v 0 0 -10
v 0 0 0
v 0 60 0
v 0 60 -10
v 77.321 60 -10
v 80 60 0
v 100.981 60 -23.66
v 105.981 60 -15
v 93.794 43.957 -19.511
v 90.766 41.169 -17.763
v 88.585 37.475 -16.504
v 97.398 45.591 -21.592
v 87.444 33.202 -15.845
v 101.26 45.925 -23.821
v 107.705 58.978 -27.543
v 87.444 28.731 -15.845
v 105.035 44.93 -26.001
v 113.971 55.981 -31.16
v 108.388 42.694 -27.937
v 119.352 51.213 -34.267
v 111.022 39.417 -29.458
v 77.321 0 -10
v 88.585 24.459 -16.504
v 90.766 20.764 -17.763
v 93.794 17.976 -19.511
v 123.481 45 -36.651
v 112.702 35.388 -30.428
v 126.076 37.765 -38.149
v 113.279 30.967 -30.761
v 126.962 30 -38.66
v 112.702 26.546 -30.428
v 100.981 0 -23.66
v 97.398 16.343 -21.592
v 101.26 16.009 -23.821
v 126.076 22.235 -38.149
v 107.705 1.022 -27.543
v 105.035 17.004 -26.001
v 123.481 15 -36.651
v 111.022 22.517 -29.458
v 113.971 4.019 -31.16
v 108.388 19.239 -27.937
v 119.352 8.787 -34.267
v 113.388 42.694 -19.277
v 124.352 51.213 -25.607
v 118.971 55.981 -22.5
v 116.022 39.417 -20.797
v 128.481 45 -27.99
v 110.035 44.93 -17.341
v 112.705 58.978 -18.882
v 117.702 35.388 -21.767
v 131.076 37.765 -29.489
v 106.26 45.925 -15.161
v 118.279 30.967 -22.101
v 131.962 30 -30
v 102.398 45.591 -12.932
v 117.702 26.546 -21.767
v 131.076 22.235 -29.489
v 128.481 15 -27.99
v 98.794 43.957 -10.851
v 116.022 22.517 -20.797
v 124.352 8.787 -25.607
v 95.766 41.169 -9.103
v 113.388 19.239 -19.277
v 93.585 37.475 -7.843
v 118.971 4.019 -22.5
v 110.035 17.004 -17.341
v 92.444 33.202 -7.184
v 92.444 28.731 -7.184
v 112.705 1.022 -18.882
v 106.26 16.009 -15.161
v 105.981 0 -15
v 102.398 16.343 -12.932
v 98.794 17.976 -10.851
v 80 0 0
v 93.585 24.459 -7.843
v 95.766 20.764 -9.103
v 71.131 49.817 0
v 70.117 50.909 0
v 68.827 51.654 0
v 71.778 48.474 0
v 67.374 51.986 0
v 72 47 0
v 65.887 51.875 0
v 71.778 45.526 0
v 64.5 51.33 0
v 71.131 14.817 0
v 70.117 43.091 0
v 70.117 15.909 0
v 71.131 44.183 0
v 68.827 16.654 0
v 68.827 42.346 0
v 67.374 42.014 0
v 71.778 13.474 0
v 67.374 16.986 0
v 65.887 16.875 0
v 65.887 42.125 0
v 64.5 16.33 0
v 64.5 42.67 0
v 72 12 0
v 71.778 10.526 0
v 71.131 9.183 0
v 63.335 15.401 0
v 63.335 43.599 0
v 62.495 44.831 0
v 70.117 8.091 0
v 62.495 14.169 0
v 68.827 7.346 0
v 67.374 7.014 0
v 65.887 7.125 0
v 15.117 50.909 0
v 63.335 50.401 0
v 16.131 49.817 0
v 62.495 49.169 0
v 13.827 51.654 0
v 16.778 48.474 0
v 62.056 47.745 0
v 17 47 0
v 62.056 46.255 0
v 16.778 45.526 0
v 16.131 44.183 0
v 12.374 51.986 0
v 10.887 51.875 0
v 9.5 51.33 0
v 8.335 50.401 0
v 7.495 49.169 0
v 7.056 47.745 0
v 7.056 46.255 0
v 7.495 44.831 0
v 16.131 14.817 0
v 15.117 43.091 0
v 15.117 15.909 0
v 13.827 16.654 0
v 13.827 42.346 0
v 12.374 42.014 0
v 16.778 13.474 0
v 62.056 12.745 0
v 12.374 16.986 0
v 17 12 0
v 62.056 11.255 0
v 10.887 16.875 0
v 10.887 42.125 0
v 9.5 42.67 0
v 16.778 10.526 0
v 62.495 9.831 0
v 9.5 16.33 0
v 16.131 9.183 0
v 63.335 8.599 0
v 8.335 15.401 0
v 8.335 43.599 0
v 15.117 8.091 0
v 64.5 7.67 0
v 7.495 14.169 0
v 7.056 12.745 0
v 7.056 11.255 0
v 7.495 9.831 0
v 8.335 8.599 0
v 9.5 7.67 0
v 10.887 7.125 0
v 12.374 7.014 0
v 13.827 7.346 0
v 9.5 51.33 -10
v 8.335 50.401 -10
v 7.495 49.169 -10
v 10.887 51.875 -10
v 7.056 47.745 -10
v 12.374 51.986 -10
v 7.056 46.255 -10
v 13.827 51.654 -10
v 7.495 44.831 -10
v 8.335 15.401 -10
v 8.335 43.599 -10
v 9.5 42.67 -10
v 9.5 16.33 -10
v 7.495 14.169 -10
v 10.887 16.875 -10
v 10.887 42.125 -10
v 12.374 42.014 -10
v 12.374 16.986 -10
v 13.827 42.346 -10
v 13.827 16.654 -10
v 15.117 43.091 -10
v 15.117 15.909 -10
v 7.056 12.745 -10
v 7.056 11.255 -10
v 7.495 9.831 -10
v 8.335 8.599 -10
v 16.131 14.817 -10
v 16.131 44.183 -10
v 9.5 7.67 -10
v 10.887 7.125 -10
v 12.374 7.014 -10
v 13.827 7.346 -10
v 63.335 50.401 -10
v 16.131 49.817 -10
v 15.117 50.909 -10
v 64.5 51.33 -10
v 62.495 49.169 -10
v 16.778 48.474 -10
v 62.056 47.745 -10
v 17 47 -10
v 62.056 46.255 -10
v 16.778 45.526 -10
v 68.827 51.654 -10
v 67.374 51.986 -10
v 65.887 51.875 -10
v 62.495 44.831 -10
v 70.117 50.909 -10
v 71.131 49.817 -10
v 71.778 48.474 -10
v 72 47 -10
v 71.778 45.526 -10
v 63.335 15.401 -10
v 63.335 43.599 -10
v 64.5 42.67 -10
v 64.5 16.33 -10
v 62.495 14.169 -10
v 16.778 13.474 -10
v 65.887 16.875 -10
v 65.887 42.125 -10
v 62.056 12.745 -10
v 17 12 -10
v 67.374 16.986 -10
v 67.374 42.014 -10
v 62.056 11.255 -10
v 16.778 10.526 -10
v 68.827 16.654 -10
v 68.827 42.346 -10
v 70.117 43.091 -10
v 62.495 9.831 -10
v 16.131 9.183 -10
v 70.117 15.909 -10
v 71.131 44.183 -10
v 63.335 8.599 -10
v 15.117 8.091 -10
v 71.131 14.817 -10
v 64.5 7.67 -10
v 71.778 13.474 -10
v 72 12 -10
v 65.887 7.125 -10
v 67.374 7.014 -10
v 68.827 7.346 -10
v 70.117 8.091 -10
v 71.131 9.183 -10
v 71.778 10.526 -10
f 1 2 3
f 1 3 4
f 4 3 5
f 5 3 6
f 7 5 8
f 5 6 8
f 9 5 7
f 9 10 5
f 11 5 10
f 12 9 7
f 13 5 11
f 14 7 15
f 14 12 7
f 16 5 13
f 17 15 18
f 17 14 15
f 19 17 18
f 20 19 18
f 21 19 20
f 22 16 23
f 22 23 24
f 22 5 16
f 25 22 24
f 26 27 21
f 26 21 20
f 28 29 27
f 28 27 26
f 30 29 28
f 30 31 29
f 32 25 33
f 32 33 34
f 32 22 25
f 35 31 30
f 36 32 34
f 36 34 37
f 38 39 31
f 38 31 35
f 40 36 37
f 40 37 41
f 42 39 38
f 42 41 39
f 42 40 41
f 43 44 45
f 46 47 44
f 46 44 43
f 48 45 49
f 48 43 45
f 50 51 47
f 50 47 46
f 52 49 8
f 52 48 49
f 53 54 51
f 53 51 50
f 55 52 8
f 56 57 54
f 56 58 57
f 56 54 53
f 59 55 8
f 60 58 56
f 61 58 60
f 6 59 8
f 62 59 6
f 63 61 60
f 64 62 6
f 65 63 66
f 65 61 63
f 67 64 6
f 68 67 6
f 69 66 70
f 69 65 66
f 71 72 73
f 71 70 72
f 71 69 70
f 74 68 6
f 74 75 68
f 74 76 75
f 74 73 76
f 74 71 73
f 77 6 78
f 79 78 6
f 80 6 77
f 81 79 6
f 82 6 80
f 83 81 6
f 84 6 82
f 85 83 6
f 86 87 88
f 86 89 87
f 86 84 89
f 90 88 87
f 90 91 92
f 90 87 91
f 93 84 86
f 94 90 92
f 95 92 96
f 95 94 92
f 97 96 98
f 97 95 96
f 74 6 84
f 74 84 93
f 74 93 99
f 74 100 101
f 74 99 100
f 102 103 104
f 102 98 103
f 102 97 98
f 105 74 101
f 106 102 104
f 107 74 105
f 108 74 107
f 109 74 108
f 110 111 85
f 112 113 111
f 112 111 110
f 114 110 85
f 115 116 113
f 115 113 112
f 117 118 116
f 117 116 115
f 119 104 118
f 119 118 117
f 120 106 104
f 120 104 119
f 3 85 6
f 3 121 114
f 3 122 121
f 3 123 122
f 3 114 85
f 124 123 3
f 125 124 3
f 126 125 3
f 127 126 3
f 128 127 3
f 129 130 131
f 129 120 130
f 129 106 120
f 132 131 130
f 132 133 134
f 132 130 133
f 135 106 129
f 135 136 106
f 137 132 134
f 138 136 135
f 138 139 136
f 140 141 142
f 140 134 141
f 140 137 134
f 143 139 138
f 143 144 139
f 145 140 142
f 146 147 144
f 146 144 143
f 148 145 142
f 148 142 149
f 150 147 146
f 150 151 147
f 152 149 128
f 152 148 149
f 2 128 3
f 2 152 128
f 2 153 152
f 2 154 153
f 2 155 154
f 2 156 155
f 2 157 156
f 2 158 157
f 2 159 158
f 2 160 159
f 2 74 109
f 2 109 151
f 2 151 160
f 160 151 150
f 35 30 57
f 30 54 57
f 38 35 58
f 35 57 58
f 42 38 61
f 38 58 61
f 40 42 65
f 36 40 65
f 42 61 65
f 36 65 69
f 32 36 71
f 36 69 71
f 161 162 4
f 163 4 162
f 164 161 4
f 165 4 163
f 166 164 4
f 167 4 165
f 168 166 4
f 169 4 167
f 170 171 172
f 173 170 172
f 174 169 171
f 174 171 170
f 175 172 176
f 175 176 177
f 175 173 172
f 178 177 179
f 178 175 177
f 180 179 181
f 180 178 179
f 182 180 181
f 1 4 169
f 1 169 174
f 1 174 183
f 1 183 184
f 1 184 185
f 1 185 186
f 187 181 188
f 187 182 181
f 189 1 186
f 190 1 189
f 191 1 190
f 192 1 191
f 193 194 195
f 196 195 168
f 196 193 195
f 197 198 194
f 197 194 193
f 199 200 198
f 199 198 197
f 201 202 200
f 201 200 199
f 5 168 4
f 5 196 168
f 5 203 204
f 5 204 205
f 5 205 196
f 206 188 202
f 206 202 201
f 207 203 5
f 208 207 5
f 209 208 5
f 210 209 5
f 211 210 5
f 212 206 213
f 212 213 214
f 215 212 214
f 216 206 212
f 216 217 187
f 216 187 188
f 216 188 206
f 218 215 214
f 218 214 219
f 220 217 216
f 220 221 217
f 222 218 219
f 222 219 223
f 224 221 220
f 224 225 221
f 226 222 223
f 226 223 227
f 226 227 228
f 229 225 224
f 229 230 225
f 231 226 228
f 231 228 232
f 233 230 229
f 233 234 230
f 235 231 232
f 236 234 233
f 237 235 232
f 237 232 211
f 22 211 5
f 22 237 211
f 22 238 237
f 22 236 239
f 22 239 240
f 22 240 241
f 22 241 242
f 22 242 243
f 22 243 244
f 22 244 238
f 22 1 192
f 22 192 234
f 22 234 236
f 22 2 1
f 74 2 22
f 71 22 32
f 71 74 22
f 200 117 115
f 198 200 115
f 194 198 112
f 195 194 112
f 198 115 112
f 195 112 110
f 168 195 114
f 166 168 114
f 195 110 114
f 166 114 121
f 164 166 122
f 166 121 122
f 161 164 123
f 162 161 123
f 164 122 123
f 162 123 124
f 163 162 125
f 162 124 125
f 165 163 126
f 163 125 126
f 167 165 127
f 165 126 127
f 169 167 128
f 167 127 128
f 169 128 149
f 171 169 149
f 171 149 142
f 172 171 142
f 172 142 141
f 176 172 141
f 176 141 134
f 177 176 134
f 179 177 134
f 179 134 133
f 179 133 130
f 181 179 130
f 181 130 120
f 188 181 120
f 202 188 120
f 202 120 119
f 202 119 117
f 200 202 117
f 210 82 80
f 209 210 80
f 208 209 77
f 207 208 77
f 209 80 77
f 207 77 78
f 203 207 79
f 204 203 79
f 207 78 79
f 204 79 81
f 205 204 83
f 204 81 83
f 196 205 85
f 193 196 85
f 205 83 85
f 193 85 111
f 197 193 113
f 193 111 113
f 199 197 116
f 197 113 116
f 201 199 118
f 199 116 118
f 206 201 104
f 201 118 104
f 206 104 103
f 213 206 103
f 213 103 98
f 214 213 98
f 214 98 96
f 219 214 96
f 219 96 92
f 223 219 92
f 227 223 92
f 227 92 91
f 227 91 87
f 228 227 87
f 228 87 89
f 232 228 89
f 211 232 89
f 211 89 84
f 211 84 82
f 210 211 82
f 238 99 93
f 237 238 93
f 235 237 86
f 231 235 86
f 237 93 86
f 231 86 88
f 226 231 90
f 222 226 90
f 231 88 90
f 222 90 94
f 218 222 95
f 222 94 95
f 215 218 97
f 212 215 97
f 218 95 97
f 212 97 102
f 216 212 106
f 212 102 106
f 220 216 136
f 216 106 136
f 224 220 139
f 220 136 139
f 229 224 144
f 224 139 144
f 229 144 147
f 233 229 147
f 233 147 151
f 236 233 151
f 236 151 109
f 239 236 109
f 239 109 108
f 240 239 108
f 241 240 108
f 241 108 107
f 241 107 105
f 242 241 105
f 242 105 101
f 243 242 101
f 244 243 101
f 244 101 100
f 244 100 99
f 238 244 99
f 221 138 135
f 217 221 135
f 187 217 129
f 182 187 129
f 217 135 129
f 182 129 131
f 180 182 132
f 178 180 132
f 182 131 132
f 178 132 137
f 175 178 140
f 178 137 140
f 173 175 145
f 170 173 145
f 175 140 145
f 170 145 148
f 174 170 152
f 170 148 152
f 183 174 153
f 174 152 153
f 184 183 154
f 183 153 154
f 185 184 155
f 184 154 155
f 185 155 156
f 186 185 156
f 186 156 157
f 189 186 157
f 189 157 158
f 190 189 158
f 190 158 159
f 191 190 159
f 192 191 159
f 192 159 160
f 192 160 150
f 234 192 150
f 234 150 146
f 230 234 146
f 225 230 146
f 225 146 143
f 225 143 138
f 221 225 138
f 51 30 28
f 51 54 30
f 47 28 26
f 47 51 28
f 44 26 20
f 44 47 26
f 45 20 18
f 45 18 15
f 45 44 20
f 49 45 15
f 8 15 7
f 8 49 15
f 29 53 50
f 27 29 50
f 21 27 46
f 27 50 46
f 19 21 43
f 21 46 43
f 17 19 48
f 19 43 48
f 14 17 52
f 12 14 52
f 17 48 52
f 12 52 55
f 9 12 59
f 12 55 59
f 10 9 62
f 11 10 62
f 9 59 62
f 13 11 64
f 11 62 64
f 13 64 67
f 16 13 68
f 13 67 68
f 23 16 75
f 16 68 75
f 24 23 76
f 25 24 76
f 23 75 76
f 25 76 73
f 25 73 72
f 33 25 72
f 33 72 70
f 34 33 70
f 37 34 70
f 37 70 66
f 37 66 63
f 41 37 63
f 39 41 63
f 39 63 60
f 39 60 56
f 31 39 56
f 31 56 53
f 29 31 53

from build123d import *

# Parameters (mm, degrees)
F1_DEPTH = 60
F2_R     = 29.99999
F3_R     = 15
F4_DEPTH = 78.3
F5_R     = 5
F6_DEPTH = 25


# Not quite as in the source:
# - a fillet or chamfer is up to 0.001 mm smaller than in the source, because OpenCascade refuses the exact size


with BuildPart() as f1:
    # F0 (on Front) → F1 (new body)
    with BuildSketch(Plane.XZ):
        Polygon((80, 0), (0, 0), (0, -10), (77.3205080757, -10), (126.9615242271, -38.6602540378), (131.9615242271, -30), align=None)
    extrude(amount=-F1_DEPTH)

    # F2 (radius 30 in the source; OpenCascade refuses exactly that, so slightly less here)
    f2_edges = [f1.edges().sort_by_distance(p)[0] for p in [
        (129.461524, 60, -34.330127),
        (129.461524, 0, -34.330127),
    ]]
    fillet(f2_edges, radius=F2_R)

    # F3 (on face) → F4 (cut)
    with BuildSketch(Plane(origin=(20, 0, 34.6410161514), x_dir=(0.8660254038, 0, -0.5), z_dir=(0.5, 0, 0.8660254038))):
        with Locations((98.4833240509, 30.9668332338)):
            Circle(F3_R)
    extrude(amount=-F4_DEPTH, mode=Mode.SUBTRACT)

    # F5 (on face) → F6 (cut)
    with BuildSketch(Plane.XY):
        with Locations((12, 47)):
            Circle(F5_R)
        with Locations((12, 12)):
            Circle(F5_R)
        with Locations((67, 12)):
            Circle(F5_R)
        with Locations((67, 47)):
            Circle(F5_R)
    extrude(amount=-F6_DEPTH, mode=Mode.SUBTRACT)


solid = f1.part
